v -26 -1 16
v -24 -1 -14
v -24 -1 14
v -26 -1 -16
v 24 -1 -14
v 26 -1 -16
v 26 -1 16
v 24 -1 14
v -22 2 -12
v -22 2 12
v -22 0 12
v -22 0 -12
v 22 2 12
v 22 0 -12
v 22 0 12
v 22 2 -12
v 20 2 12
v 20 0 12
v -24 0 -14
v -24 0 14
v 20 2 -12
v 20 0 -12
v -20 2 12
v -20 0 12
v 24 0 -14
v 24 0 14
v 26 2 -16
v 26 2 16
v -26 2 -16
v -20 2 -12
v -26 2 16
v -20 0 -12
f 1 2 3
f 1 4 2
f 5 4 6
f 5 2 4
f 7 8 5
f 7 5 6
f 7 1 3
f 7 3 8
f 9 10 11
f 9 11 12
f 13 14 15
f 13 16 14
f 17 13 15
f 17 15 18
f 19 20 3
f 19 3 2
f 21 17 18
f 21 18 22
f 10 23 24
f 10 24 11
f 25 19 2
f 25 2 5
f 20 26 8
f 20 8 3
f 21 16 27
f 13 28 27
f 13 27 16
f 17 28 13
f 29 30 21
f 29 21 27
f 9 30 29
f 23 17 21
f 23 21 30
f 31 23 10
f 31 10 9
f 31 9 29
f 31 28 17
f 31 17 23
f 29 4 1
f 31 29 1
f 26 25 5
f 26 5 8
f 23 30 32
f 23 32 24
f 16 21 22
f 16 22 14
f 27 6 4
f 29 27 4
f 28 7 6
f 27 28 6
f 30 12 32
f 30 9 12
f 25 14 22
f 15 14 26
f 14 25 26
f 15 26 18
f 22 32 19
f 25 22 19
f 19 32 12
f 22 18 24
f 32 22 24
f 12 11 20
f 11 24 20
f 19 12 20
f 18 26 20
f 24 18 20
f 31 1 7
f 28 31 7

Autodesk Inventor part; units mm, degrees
ref_plane "YZ Plane" through (0, 0, 0) normal (1, 0, 0) x (0, 1, 0)
ref_plane "XZ Plane" through (0, 0, 0) normal (0, 1, 0) x (-1, 0, 0)
ref_plane "XY Plane" through (0, 0, 0) normal (0, 0, 1) x (1, 0, 0)
sketch "Sketch1" plane through (0, 0, 0) normal (0, 1, 0) x (-1, 0, 0)
  line L0 (26, 16) -> (-26, 16)
  line L1 (-26, 16) -> (-26, -16)
  line L2 (-26, -16) -> (26, -16)
  line L3 (26, -16) -> (26, 16)
  line L4 (26, 16) -> (-26, -16) construction
  line L5 (-26, 16) -> (26, -16) construction
  point P0 (0, 0)
  dimension "d0" = 52
  dimension "d1" = 32
extrude "Extrusion1" add sketch "Sketch1" along normal blind 2
sketch "Sketch2" plane through (0, 0, 0) normal (0, -1, 0) x (1, 0, 0)
  point P0 (0, 0)
sketch "Sketch3" plane through (0, 0, 0) normal (0, -1, 0) x (1, 0, 0)
  line L0 (-26, 16) -> (26, 16) projected
  line L1 (-26, -16) -> (-26, 16) projected
  line L2 (26, -16) -> (-26, -16) projected
  line L3 (26, 16) -> (26, -16) projected
  line L4 (24, 14) -> (-24, 14)
  line L5 (-24, 14) -> (-24, -14)
  line L6 (-24, -14) -> (24, -14)
  line L7 (24, -14) -> (24, 14)
  point P0 (0, 0)
  dimension "d4" = 2
extrude "Extrusion2" add sketch "Sketch3" along normal blind 1
sketch "Sketch4" plane through (0, 0, 0) normal (0, -1, 0) x (1, 0, 0)
  point P0 (0, 0)
sketch "Sketch5" plane through (0, 2, 0) normal (0, 1, 0) x (1, 0, 0)
  line L0 (-22, 12) -> (-20, 12)
  line L1 (-20, 12) -> (-20, -12)
  line L2 (-20, -12) -> (-22, -12)
  line L3 (-22, -12) -> (-22, 12)
  line L4 (-26, 16) -> (-26, -16) projected
  line L5 (26, 16) -> (-26, 16) projected
  line L6 (-26, -16) -> (26, -16) projected
  point P0 (0, 0)
  dimension "d7" = 2
  dimension "d8" = 4
  dimension "d9" = 4
  dimension "d10" = 4
extrude "Extrusion3" cut sketch "Sketch5" against normal through all
mirror "Mirror1" about plane through (0, 0, 0) normal (1, 0, 0) of "Extrusion3"
properties part number "5x3holder" material "PET Plastic"
